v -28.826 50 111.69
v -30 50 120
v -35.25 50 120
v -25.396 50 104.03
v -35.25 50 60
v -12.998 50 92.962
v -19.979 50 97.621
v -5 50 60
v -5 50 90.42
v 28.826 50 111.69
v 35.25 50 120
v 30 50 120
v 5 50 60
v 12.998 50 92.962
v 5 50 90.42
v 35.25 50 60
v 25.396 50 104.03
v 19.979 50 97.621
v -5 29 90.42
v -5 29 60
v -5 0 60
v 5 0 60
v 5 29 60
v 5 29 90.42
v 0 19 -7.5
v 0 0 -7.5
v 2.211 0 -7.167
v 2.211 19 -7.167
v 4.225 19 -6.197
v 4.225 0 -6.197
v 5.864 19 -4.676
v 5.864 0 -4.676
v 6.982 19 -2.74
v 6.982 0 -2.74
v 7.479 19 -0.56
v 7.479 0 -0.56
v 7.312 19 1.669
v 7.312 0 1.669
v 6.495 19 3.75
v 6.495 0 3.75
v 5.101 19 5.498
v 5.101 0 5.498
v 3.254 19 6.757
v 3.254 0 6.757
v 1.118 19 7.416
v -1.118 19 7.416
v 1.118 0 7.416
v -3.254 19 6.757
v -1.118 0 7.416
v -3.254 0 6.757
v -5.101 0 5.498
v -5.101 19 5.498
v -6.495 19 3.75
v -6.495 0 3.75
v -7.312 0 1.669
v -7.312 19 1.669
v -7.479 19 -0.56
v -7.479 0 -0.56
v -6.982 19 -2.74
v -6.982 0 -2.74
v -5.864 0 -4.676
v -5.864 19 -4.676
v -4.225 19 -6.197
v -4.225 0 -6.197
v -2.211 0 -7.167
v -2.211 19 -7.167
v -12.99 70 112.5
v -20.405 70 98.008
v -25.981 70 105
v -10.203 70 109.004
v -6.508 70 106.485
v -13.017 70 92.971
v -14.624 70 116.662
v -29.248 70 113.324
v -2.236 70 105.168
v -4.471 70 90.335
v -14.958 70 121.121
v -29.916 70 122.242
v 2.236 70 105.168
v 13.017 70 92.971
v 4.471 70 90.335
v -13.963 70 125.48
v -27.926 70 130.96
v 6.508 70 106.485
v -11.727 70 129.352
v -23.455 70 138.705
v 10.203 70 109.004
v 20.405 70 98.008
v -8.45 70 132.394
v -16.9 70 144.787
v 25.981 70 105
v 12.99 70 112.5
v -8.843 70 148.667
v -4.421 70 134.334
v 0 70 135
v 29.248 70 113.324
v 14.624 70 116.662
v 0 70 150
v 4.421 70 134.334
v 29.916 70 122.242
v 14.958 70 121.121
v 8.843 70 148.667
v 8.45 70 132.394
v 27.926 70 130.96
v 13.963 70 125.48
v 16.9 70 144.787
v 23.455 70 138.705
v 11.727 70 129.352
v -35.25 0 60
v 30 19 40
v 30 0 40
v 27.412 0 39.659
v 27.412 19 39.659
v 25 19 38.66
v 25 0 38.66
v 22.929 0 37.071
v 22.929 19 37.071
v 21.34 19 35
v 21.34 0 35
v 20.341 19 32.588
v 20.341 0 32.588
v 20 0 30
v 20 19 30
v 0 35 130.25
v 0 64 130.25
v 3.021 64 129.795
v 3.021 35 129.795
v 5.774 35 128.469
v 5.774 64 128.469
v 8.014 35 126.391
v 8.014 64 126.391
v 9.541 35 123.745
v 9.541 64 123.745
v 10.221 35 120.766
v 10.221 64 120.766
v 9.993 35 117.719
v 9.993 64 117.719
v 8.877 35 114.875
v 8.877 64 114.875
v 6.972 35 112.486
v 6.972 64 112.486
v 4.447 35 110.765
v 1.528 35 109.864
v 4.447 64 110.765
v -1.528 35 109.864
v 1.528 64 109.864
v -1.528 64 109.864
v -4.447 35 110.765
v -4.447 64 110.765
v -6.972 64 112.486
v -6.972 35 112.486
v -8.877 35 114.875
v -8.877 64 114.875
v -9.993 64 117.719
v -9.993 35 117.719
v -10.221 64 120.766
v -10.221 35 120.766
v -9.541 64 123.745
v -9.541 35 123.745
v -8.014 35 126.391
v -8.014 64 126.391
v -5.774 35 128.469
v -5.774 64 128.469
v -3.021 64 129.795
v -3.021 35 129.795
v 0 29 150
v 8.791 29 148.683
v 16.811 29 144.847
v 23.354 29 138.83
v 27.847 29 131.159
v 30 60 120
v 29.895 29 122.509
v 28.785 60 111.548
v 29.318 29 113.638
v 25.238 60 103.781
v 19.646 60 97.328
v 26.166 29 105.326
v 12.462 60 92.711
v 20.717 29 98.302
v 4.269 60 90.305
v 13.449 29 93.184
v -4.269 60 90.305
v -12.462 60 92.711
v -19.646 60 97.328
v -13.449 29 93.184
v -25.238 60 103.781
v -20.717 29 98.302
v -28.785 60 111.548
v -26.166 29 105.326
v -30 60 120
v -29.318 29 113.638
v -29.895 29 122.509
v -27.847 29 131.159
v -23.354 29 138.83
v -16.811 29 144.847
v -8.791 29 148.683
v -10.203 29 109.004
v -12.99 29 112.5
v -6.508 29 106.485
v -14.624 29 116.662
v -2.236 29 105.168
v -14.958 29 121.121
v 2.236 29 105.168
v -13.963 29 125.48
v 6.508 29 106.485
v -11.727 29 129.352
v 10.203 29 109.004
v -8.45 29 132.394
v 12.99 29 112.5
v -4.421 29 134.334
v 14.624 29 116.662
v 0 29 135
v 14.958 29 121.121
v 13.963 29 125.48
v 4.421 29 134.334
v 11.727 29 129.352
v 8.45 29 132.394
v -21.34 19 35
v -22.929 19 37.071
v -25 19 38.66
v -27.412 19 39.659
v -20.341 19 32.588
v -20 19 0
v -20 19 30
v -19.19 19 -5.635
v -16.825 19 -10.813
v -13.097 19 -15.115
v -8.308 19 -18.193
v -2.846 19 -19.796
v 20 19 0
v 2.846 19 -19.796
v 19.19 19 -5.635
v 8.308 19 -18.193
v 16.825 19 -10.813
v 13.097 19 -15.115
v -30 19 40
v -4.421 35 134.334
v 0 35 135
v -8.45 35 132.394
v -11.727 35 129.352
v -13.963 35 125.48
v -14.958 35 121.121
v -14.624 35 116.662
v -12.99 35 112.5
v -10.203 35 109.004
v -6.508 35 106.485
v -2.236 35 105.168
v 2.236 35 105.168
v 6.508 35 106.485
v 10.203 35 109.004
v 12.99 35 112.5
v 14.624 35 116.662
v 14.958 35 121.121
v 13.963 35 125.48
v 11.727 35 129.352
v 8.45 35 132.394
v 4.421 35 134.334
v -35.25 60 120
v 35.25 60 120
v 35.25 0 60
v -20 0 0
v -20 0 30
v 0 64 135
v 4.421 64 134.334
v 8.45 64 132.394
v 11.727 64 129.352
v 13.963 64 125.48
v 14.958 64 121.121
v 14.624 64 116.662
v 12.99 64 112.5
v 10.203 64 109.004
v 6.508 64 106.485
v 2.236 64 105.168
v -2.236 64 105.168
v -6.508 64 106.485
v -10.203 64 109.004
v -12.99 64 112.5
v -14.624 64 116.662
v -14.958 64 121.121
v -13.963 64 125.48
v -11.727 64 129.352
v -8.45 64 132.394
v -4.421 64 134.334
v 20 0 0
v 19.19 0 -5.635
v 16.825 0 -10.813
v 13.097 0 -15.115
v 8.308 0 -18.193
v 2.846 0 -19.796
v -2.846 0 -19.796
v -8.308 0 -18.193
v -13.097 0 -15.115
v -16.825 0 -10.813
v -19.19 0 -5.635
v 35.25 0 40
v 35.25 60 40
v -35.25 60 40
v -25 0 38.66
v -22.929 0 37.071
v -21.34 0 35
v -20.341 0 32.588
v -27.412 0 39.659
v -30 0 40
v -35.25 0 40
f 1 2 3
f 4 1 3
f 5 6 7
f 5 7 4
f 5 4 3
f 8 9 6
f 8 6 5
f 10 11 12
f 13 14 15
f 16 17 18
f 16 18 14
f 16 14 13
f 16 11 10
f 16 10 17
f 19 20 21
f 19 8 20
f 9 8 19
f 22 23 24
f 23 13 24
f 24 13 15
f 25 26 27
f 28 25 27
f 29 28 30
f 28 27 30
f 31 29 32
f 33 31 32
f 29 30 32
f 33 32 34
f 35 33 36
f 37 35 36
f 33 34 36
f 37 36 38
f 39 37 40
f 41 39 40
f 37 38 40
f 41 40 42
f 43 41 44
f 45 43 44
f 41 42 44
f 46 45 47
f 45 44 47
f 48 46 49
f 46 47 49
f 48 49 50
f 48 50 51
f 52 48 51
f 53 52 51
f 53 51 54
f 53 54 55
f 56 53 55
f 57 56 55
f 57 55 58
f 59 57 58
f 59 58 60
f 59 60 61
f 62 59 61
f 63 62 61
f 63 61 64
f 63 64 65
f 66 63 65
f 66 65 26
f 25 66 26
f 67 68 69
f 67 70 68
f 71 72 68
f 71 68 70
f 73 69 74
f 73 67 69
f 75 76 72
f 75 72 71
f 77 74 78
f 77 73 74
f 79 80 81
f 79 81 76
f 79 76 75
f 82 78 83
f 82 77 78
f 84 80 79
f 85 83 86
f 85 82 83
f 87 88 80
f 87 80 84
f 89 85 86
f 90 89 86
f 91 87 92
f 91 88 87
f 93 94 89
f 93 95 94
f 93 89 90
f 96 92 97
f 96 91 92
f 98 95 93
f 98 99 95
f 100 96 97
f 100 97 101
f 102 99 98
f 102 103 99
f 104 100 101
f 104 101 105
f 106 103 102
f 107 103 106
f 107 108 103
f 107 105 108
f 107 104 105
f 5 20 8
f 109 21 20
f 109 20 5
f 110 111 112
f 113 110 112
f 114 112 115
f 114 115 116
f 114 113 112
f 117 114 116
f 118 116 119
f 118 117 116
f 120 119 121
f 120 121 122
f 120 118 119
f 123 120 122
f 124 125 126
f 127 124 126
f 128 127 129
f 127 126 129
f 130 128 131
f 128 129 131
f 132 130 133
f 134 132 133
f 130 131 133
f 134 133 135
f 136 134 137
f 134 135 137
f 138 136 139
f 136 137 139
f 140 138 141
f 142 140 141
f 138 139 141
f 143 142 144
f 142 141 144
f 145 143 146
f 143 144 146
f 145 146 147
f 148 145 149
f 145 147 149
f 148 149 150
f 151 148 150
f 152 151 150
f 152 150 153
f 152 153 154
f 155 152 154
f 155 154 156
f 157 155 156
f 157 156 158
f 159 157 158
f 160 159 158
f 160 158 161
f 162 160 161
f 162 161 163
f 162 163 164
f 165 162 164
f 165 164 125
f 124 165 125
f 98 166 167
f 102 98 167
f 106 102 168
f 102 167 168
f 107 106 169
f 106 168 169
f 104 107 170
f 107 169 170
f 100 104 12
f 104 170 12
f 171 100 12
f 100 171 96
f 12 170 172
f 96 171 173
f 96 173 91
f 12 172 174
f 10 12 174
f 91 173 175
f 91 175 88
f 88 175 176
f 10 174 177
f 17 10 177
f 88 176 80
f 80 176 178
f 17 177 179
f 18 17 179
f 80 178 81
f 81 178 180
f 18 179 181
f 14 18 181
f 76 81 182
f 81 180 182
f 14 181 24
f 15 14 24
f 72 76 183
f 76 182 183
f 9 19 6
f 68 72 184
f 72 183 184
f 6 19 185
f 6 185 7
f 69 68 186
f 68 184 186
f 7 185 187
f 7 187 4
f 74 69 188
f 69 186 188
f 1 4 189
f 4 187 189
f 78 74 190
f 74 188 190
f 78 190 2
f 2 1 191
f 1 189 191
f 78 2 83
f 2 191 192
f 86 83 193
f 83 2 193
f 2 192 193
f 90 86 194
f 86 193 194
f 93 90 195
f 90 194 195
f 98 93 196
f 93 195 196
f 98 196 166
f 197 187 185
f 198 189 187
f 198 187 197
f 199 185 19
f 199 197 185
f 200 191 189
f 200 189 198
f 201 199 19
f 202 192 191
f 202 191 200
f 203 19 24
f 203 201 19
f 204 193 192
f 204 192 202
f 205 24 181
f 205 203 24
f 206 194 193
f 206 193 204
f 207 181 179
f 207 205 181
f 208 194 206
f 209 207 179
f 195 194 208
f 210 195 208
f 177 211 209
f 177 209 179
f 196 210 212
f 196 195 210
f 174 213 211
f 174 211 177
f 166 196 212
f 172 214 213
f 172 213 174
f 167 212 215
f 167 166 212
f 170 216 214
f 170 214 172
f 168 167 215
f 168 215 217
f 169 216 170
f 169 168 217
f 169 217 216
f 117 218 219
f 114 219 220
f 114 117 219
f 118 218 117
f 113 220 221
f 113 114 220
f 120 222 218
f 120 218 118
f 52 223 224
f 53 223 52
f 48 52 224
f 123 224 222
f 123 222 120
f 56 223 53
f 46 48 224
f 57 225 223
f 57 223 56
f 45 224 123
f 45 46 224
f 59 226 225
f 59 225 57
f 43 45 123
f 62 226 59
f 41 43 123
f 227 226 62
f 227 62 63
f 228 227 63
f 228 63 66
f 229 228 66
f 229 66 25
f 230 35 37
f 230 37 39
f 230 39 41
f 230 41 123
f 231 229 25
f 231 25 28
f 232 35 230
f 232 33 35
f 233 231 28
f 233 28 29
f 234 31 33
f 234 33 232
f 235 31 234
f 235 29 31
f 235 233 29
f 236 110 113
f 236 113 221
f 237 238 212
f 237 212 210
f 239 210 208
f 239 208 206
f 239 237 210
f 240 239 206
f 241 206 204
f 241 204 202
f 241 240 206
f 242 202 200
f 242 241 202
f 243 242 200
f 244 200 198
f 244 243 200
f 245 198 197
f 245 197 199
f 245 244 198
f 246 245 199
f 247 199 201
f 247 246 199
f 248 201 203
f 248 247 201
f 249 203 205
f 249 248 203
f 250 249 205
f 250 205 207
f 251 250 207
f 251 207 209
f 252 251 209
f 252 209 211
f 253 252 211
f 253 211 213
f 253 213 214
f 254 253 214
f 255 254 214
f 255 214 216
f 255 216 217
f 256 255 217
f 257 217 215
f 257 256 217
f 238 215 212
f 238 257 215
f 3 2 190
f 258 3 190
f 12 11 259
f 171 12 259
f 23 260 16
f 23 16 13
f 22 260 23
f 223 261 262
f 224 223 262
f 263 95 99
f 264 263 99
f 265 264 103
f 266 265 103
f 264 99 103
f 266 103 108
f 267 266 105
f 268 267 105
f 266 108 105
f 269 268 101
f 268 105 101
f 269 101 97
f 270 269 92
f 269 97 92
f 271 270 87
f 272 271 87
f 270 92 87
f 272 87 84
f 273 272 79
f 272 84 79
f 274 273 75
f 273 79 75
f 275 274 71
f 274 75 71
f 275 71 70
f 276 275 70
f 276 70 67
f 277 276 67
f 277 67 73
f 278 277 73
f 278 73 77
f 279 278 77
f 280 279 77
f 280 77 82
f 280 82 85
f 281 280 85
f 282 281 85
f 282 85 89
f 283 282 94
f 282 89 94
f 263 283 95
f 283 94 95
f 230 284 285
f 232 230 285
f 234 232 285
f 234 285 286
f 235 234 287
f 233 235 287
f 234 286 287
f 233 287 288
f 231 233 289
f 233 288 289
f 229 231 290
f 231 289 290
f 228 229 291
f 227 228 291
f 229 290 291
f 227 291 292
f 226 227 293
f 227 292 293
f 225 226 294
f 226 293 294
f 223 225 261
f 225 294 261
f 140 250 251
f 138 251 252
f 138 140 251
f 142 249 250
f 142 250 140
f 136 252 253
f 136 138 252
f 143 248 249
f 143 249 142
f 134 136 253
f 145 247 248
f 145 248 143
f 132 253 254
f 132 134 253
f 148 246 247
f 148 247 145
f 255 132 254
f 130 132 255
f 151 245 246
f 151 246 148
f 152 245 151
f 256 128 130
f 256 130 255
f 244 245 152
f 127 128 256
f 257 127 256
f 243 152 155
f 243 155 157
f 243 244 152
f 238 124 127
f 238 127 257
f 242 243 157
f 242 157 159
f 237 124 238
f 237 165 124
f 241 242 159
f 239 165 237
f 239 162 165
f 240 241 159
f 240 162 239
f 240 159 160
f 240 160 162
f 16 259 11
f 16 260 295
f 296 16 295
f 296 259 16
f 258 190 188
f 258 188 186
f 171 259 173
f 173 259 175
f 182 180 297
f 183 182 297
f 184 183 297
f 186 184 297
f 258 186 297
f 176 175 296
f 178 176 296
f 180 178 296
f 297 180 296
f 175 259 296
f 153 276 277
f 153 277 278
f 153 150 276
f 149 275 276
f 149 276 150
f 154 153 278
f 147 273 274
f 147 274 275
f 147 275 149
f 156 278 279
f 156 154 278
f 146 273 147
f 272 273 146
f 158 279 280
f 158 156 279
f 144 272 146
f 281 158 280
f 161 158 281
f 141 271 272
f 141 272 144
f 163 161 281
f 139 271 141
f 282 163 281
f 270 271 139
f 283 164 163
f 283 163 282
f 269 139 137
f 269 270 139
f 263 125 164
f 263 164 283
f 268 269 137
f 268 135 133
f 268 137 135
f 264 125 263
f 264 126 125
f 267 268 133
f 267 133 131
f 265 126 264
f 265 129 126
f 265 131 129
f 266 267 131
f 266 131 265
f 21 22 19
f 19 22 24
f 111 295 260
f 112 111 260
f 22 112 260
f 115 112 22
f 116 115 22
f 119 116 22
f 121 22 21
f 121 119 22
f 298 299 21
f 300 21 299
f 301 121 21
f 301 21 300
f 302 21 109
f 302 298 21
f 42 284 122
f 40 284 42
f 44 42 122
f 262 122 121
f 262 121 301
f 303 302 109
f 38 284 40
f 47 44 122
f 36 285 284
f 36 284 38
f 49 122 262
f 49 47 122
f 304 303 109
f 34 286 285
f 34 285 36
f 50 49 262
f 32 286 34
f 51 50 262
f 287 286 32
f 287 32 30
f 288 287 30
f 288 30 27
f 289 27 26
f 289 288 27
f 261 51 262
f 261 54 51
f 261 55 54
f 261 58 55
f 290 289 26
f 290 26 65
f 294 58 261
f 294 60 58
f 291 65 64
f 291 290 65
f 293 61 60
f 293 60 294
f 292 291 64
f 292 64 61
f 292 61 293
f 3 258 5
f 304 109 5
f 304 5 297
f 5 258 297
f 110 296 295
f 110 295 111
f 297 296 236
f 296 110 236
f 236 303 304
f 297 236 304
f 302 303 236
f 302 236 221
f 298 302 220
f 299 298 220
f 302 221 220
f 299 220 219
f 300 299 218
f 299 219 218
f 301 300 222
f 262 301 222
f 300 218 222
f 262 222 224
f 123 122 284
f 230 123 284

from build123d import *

# Parameters (mm, degrees)
BOSS_EXTRUDE1_DEPTH      = 19
BOSS_EXTRUDE3_DEPTH      = 60
FILLET1_R                = 10
FILLET2_R                = 10
SKETCH4_R                = 7.5
CUT_EXTRUDE1_DEPTH       = 60
SKETCH6_W                = 60
SKETCH6_H                = 10
BOSS_EXTRUDE4_DEPTH      = 70.5
CUT_EXTRUDE2_DEPTH       = 70.5
BOSS_EXTRUDE6_DEPTH      = 10
BOSS_EXTRUDE6_DEPTH_BACK = 31
SKETCH8_R                = 30
SKETCH10_R               = 10.25
CUT_EXTRUDE3_DEPTH       = 41
SKETCH11_R               = 15
CUT_EXTRUDE4_DEPTH       = 6
CUT_EXTRUDE5_START       = -6
SKETCH12_R               = 15
CUT_EXTRUDE5_DEPTH       = 6
SKETCH13_W               = 10
SKETCH13_H               = 30.419601085
BOSS_EXTRUDE7_DEPTH      = 30
BOSS_EXTRUDE8_DEPTH      = 10


with BuildPart() as part:
    # Sketch1 → Boss-Extrude1 (new body)
    with BuildSketch(Plane(origin=(0, 0, 0), x_dir=(1, 0, 0), z_dir=(0, 1, 0))):
        with BuildLine():
            Line((-20, 0), (-20, -40))
            Line((-20, -40), (20, -40))
            Line((20, -40), (20, 0))
            ThreePointArc((20, 0), (0, 20), (-20, 0))
        make_face()
    extrude(amount=BOSS_EXTRUDE1_DEPTH)

    # Sketch3 → Boss-Extrude3 (add)
    with BuildSketch(Plane(origin=(0, 0, 0), x_dir=(1, 0, 0), z_dir=(0, 1, 0))):
        Polygon((0, -40), (35.25, -40), (35.25, -60), (-35.25, -60), (-35.25, -40), align=None)
    extrude(amount=BOSS_EXTRUDE3_DEPTH)

    # Fillet1
    fillet1_edges = [part.edges().sort_by_distance(p)[0] for p in [
        (20, 9.5, 40),
    ]]
    fillet(fillet1_edges, radius=FILLET1_R)

    # Fillet2
    fillet2_edges = [part.edges().sort_by_distance(p)[0] for p in [
        (-20, 9.5, 40),
    ]]
    fillet(fillet2_edges, radius=FILLET2_R)

    # Sketch4 → Cut-Extrude1 (cut)
    with BuildSketch(Plane.XZ):
        with Locations(Location((0, 0, 0), (0, 0, 270))):
            Circle(SKETCH4_R)
    extrude(amount=-CUT_EXTRUDE1_DEPTH, mode=Mode.SUBTRACT)

    # Sketch6 → Boss-Extrude4 (add)
    with BuildSketch(Plane(origin=(35.25, 0, 0), x_dir=(0, 0, -1), z_dir=(1, 0, 0))):
        with Locations((-90, 55)):
            Rectangle(SKETCH6_W, SKETCH6_H)
    extrude(amount=-BOSS_EXTRUDE4_DEPTH)

    # Sketch7 → Cut-Extrude2 (cut)
    with BuildSketch(Plane(origin=(0, 60, 0), x_dir=(1, 0, 0), z_dir=(0, 1, 0))):
        with BuildLine():
            Line((-30, -120), (30, -120))
            ThreePointArc((30, -120), (0, -90), (-30, -120))
        make_face()
    extrude(amount=-CUT_EXTRUDE2_DEPTH, mode=Mode.SUBTRACT)

    # Sketch8 → Boss-Extrude6 (add, two sides: drawn at the far end of the back side and taken through both)
    with BuildSketch(Plane(origin=(0, 60, 0), x_dir=(1, 0, 0), z_dir=(0, 1, 0)).offset(-BOSS_EXTRUDE6_DEPTH_BACK)):
        with Locations(Location((0, -120, 0), (0, 0, 270))):
            Circle(SKETCH8_R)
    extrude(amount=BOSS_EXTRUDE6_DEPTH + BOSS_EXTRUDE6_DEPTH_BACK)

    # Sketch10 → Cut-Extrude3 (cut)
    with BuildSketch(Plane(origin=(0, 70, 0), x_dir=(1, 0, 0), z_dir=(0, 1, 0))):
        with Locations(Location((0, -120, 0), (0, 0, 270))):
            Circle(SKETCH10_R)
    extrude(amount=-CUT_EXTRUDE3_DEPTH, mode=Mode.SUBTRACT)

    # Sketch11 → Cut-Extrude4 (cut)
    with BuildSketch(Plane(origin=(0, 70, 0), x_dir=(1, 0, 0), z_dir=(0, 1, 0))):
        with Locations(Location((0, -120, 0), (0, 0, 270))):
            Circle(SKETCH11_R)
    extrude(amount=-CUT_EXTRUDE4_DEPTH, mode=Mode.SUBTRACT)

    # Sketch12 → Cut-Extrude5 (cut)
    with BuildSketch(Plane.XZ.offset(-29).offset(CUT_EXTRUDE5_START)):
        with Locations(Location((0, 120, 0), (0, 0, 90))):
            Circle(SKETCH12_R)
    extrude(amount=CUT_EXTRUDE5_DEPTH, mode=Mode.SUBTRACT)

    # Sketch13 → Boss-Extrude7 (add)
    with BuildSketch(Plane.XZ.offset(-29)):
        with Locations((0, 75.209800543)):
            Rectangle(SKETCH13_W, SKETCH13_H)
    extrude(amount=-BOSS_EXTRUDE7_DEPTH)

    # Sketch16 → Boss-Extrude8 (add)
    with BuildSketch(Plane(origin=(5, 0, 0), x_dir=(0, 0, -1), z_dir=(1, 0, 0))):
        Polygon((-90.419601085, 29), (-60, 29), (-60, 0), align=None)
    extrude(amount=-BOSS_EXTRUDE8_DEPTH)


solid = part.part
